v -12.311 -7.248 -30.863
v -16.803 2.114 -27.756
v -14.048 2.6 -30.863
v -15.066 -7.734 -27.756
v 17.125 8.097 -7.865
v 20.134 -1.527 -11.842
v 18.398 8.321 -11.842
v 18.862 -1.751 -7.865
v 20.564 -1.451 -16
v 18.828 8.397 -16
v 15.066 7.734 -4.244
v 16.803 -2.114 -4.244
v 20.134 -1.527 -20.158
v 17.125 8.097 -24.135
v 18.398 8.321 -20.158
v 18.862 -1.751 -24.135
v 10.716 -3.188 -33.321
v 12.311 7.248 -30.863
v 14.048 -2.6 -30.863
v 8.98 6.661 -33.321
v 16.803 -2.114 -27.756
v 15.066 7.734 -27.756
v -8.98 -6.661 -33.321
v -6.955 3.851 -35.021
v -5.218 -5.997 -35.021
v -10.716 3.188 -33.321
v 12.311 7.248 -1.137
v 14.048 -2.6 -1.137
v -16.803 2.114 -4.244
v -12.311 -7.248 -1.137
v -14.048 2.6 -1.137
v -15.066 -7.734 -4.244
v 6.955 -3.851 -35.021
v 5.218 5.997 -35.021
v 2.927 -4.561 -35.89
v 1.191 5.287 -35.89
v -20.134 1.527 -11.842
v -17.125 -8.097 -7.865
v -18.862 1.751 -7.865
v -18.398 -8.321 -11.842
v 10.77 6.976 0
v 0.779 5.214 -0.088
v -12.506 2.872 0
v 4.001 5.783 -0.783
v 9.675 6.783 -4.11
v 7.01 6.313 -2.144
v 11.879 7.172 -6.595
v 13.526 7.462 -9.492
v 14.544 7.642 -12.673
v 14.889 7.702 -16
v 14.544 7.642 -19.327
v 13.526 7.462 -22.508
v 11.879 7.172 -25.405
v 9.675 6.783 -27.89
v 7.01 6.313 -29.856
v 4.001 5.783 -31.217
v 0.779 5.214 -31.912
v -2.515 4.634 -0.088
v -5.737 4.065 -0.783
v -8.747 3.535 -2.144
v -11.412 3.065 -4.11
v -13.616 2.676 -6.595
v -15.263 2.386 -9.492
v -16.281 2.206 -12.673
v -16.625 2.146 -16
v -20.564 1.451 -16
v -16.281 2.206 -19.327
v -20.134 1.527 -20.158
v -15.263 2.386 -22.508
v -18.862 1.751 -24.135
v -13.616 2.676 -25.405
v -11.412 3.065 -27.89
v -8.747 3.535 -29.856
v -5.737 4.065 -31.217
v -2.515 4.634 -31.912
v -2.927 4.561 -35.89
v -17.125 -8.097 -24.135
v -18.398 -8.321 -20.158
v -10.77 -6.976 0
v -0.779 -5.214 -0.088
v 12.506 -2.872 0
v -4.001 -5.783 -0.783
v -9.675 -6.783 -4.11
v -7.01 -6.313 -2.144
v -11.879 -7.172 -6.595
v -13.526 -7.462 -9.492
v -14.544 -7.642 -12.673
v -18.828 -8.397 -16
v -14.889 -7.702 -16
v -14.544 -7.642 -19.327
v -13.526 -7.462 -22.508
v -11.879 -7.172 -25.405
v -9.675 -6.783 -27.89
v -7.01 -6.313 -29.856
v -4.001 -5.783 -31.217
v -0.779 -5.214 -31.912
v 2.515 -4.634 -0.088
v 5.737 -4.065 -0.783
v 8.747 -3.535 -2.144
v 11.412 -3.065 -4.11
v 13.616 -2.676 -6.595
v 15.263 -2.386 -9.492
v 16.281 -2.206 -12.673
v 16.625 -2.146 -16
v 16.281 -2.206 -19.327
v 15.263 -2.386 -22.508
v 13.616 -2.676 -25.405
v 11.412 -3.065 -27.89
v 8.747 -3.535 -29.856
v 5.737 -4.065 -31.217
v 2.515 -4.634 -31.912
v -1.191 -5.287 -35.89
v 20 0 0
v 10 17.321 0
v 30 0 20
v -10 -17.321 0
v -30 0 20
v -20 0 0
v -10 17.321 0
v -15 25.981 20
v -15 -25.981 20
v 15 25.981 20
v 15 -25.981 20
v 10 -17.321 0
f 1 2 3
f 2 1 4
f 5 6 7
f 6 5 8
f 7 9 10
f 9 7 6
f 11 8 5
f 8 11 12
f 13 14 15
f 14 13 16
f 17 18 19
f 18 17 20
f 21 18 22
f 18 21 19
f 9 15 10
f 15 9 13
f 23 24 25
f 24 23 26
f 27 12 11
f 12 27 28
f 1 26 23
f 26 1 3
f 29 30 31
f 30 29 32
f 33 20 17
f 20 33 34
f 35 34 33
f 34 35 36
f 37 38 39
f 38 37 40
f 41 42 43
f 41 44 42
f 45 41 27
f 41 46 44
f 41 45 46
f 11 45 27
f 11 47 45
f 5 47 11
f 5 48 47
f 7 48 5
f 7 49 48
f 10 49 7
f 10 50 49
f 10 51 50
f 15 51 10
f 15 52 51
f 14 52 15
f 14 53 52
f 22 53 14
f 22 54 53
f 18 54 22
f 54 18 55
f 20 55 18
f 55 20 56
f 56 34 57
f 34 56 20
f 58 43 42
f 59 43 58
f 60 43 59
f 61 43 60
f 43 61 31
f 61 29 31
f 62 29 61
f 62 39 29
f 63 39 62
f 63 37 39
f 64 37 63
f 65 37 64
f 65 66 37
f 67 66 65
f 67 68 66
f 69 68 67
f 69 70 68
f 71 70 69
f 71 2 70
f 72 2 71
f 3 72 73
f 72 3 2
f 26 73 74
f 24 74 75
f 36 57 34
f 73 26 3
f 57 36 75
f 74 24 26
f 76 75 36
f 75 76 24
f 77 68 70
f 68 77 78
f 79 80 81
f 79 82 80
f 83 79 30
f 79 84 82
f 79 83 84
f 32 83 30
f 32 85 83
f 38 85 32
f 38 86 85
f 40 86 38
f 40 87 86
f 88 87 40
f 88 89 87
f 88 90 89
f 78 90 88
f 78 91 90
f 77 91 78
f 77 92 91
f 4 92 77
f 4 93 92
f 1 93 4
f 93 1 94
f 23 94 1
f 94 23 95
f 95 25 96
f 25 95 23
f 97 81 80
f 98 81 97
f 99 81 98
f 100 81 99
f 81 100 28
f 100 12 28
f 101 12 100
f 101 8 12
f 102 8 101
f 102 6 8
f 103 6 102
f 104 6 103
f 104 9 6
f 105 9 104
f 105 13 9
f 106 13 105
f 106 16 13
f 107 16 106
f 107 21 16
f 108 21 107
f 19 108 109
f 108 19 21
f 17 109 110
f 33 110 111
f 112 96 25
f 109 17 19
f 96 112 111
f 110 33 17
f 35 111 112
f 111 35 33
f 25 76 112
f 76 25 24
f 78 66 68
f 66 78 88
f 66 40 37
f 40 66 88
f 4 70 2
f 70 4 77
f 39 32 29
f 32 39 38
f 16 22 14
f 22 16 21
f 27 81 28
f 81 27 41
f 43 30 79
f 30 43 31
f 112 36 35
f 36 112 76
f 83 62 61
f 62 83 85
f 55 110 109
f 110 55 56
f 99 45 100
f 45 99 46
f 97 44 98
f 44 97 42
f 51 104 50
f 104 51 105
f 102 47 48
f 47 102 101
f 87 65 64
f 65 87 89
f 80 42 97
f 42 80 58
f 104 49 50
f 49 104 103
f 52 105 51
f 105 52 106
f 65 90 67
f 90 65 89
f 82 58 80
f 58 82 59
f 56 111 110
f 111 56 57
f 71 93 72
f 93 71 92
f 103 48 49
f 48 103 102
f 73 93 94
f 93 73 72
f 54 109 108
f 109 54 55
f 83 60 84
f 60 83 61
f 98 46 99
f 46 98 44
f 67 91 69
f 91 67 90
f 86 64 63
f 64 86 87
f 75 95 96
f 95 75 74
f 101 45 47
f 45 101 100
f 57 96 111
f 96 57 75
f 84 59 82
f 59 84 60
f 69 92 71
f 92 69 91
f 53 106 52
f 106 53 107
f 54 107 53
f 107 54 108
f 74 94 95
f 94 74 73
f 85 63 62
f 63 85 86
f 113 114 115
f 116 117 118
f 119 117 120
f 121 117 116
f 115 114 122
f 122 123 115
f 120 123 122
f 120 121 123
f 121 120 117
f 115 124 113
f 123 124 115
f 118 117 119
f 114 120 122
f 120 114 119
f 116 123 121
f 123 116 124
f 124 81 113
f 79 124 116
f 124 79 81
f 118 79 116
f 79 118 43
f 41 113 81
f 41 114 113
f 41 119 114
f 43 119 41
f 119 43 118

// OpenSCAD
//low poly ring
    d_h =(20); //height
    d_r =(20);//r1
    d_r2 =(30);//r2
    d_s =(6); //$fn or how many sides

   

//cylinder(h = h_l, r1 = h_w, r2 = h_r, $fs = h_v);

cylinder(h = d_h , r1= d_r, r2 = d_r2, $fn = d_s);


 r_r = (20);// ring radius

 
translate([0, 0, -16]){
rotate([90 ,0 ,10]){
difference() {
cylinder( h = 10,  r = r_r, center = true);
cylinder( h = 15, r = r_r-4, center = true);
}


}


}
